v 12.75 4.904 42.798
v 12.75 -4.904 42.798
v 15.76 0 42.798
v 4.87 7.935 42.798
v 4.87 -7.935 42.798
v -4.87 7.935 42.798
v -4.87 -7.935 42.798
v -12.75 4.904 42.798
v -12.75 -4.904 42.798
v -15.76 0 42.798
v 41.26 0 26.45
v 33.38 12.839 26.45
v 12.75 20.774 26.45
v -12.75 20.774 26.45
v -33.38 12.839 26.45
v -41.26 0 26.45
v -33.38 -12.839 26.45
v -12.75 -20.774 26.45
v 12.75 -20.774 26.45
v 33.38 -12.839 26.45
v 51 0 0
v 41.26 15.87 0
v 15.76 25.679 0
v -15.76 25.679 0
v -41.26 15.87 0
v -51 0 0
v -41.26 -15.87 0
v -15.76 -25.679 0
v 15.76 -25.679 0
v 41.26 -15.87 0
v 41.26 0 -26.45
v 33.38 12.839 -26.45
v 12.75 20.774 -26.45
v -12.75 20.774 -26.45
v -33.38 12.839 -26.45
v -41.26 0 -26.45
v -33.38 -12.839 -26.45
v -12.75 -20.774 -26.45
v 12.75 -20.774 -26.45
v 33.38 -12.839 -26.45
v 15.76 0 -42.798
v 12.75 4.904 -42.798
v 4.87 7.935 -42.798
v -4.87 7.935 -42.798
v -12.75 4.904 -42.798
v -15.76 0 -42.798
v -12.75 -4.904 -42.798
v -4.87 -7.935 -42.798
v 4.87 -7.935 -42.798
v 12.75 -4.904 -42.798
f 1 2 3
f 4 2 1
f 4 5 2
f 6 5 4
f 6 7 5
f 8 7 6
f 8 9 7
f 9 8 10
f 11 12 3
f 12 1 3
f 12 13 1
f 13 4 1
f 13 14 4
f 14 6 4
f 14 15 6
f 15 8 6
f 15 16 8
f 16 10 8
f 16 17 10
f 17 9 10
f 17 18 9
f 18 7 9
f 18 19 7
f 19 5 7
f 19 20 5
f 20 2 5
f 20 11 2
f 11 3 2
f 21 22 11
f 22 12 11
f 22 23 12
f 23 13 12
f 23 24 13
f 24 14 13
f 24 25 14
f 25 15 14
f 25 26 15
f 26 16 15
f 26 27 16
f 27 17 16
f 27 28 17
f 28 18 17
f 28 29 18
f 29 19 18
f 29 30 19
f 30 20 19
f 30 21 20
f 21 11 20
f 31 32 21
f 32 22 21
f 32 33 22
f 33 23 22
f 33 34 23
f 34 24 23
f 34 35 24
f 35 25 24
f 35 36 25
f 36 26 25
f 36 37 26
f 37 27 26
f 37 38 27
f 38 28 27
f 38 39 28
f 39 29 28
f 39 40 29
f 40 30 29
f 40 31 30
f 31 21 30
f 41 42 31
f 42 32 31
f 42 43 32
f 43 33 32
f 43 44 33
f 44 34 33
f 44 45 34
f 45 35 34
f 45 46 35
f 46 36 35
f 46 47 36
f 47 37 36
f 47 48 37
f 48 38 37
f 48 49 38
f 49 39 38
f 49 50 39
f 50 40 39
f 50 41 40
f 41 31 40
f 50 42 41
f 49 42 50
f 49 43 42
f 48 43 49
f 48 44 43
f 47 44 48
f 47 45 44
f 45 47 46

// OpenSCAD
// Generated by SolidPython 1.0.1 on 2020-07-29 00:46:53


scale(v = [17, 9, 15]) {
	sphere(r = 3);
}
/***********************************************
*********      SolidPython code:      **********
************************************************
 
# import packages: SolidPython
from solid import *
from solid.utils import *
from itertools import chain, combinations, permutations


class Resize:

    def __init__(self, scad_file):
        self.scad_file = scad_file
        #self.scad_file = import_scad(scad_file)
        # cone/cylinder param:
        self.r1 = 0
        self.r2 = 0
        self.h = 0
        # rectangular prism param:
        self.w = 0
        self.l = 0
        # ellipse param:
        self.r = 0

    # import OpenScad code (file name corresponds to shape)


    # classify shape + parameters
    def assign(self, param1, param2, param3):
        if self.scad_file == 'cone.scad':
            self.r1 = param1
            self.r2 = param2
            self.h = param3
        elif self.scad_file == 'cylinder.scad':
            self.r1 = param1
            self.r2 = param2
            self.h = param3
        elif self.scad_file == 'rectangularPrism.scad':
            self.h = param1
            self.l = param2
            self.w = param3
        else:
            self.r = param1
            self.h = param2

    # resize parameters
    def iterate(self):
        x = range(3, 20, 2)
        i = 1
        if self.scad_file == 'cone.scad':
            tempList = list(permutations(x, 2))
            for temp in tempList:
                param1 = temp[0]
                param2 = temp[1]
                filepath = 'produced_scad_files/' + 'cone' + str(param1) + '_' + str(param2) + '_' + '.scad'
                scad_render_to_file(cylinder(h=param1, r1=param2, r2=0), filepath)

        elif self.scad_file == 'cylinder.scad':
            tempList = list(permutations(x, 3))
            for temp in tempList:
                param1 = temp[0]
                param2 = temp[1]
                filepath = 'produced_scad_files/' + 'cylinder' + str(param1) + '_' + str(param2) + '_' + '.scad'
                scad_render_to_file(cylinder(h=param1, r1=param2, r2=param2), filepath)

        elif self.scad_file == 'rectangularPrism.scad':
            tempList = list(permutations(x, 3))
            for temp in tempList:
                param1 = temp[0]
                param2 = temp[1]
                param3 = temp[2]
                filepath = 'produced_scad_files/' + 'rectangularPrism' + str(param1) + '_' + str(param2) + '_' + str(
                    param3) + '.scad'
                scad_render_to_file(cube(size=(param1, param2, param3)), filepath)

        elif self.scad_file == 'ellipse.scad':
            tempList = list(permutations(x, 4))
            for temp in tempList:
                param1 = temp[0]
                param2 = temp[1]
                param3 = temp[2]
                param4 = temp[3]
                filepath = 'produced_scad_files/' + 'ellipse' + str(param1) + '_' + str(param2) + '_' + str(param3) + '_' + str(param4) + '.scad'
                scad_render_to_file(scale([param1, param2, param3])(sphere(r=param4)), filepath)

    def render_to_scadfile(self):
        scad_render_to_file(scad, 'example.scad') 
 
************************************************/
